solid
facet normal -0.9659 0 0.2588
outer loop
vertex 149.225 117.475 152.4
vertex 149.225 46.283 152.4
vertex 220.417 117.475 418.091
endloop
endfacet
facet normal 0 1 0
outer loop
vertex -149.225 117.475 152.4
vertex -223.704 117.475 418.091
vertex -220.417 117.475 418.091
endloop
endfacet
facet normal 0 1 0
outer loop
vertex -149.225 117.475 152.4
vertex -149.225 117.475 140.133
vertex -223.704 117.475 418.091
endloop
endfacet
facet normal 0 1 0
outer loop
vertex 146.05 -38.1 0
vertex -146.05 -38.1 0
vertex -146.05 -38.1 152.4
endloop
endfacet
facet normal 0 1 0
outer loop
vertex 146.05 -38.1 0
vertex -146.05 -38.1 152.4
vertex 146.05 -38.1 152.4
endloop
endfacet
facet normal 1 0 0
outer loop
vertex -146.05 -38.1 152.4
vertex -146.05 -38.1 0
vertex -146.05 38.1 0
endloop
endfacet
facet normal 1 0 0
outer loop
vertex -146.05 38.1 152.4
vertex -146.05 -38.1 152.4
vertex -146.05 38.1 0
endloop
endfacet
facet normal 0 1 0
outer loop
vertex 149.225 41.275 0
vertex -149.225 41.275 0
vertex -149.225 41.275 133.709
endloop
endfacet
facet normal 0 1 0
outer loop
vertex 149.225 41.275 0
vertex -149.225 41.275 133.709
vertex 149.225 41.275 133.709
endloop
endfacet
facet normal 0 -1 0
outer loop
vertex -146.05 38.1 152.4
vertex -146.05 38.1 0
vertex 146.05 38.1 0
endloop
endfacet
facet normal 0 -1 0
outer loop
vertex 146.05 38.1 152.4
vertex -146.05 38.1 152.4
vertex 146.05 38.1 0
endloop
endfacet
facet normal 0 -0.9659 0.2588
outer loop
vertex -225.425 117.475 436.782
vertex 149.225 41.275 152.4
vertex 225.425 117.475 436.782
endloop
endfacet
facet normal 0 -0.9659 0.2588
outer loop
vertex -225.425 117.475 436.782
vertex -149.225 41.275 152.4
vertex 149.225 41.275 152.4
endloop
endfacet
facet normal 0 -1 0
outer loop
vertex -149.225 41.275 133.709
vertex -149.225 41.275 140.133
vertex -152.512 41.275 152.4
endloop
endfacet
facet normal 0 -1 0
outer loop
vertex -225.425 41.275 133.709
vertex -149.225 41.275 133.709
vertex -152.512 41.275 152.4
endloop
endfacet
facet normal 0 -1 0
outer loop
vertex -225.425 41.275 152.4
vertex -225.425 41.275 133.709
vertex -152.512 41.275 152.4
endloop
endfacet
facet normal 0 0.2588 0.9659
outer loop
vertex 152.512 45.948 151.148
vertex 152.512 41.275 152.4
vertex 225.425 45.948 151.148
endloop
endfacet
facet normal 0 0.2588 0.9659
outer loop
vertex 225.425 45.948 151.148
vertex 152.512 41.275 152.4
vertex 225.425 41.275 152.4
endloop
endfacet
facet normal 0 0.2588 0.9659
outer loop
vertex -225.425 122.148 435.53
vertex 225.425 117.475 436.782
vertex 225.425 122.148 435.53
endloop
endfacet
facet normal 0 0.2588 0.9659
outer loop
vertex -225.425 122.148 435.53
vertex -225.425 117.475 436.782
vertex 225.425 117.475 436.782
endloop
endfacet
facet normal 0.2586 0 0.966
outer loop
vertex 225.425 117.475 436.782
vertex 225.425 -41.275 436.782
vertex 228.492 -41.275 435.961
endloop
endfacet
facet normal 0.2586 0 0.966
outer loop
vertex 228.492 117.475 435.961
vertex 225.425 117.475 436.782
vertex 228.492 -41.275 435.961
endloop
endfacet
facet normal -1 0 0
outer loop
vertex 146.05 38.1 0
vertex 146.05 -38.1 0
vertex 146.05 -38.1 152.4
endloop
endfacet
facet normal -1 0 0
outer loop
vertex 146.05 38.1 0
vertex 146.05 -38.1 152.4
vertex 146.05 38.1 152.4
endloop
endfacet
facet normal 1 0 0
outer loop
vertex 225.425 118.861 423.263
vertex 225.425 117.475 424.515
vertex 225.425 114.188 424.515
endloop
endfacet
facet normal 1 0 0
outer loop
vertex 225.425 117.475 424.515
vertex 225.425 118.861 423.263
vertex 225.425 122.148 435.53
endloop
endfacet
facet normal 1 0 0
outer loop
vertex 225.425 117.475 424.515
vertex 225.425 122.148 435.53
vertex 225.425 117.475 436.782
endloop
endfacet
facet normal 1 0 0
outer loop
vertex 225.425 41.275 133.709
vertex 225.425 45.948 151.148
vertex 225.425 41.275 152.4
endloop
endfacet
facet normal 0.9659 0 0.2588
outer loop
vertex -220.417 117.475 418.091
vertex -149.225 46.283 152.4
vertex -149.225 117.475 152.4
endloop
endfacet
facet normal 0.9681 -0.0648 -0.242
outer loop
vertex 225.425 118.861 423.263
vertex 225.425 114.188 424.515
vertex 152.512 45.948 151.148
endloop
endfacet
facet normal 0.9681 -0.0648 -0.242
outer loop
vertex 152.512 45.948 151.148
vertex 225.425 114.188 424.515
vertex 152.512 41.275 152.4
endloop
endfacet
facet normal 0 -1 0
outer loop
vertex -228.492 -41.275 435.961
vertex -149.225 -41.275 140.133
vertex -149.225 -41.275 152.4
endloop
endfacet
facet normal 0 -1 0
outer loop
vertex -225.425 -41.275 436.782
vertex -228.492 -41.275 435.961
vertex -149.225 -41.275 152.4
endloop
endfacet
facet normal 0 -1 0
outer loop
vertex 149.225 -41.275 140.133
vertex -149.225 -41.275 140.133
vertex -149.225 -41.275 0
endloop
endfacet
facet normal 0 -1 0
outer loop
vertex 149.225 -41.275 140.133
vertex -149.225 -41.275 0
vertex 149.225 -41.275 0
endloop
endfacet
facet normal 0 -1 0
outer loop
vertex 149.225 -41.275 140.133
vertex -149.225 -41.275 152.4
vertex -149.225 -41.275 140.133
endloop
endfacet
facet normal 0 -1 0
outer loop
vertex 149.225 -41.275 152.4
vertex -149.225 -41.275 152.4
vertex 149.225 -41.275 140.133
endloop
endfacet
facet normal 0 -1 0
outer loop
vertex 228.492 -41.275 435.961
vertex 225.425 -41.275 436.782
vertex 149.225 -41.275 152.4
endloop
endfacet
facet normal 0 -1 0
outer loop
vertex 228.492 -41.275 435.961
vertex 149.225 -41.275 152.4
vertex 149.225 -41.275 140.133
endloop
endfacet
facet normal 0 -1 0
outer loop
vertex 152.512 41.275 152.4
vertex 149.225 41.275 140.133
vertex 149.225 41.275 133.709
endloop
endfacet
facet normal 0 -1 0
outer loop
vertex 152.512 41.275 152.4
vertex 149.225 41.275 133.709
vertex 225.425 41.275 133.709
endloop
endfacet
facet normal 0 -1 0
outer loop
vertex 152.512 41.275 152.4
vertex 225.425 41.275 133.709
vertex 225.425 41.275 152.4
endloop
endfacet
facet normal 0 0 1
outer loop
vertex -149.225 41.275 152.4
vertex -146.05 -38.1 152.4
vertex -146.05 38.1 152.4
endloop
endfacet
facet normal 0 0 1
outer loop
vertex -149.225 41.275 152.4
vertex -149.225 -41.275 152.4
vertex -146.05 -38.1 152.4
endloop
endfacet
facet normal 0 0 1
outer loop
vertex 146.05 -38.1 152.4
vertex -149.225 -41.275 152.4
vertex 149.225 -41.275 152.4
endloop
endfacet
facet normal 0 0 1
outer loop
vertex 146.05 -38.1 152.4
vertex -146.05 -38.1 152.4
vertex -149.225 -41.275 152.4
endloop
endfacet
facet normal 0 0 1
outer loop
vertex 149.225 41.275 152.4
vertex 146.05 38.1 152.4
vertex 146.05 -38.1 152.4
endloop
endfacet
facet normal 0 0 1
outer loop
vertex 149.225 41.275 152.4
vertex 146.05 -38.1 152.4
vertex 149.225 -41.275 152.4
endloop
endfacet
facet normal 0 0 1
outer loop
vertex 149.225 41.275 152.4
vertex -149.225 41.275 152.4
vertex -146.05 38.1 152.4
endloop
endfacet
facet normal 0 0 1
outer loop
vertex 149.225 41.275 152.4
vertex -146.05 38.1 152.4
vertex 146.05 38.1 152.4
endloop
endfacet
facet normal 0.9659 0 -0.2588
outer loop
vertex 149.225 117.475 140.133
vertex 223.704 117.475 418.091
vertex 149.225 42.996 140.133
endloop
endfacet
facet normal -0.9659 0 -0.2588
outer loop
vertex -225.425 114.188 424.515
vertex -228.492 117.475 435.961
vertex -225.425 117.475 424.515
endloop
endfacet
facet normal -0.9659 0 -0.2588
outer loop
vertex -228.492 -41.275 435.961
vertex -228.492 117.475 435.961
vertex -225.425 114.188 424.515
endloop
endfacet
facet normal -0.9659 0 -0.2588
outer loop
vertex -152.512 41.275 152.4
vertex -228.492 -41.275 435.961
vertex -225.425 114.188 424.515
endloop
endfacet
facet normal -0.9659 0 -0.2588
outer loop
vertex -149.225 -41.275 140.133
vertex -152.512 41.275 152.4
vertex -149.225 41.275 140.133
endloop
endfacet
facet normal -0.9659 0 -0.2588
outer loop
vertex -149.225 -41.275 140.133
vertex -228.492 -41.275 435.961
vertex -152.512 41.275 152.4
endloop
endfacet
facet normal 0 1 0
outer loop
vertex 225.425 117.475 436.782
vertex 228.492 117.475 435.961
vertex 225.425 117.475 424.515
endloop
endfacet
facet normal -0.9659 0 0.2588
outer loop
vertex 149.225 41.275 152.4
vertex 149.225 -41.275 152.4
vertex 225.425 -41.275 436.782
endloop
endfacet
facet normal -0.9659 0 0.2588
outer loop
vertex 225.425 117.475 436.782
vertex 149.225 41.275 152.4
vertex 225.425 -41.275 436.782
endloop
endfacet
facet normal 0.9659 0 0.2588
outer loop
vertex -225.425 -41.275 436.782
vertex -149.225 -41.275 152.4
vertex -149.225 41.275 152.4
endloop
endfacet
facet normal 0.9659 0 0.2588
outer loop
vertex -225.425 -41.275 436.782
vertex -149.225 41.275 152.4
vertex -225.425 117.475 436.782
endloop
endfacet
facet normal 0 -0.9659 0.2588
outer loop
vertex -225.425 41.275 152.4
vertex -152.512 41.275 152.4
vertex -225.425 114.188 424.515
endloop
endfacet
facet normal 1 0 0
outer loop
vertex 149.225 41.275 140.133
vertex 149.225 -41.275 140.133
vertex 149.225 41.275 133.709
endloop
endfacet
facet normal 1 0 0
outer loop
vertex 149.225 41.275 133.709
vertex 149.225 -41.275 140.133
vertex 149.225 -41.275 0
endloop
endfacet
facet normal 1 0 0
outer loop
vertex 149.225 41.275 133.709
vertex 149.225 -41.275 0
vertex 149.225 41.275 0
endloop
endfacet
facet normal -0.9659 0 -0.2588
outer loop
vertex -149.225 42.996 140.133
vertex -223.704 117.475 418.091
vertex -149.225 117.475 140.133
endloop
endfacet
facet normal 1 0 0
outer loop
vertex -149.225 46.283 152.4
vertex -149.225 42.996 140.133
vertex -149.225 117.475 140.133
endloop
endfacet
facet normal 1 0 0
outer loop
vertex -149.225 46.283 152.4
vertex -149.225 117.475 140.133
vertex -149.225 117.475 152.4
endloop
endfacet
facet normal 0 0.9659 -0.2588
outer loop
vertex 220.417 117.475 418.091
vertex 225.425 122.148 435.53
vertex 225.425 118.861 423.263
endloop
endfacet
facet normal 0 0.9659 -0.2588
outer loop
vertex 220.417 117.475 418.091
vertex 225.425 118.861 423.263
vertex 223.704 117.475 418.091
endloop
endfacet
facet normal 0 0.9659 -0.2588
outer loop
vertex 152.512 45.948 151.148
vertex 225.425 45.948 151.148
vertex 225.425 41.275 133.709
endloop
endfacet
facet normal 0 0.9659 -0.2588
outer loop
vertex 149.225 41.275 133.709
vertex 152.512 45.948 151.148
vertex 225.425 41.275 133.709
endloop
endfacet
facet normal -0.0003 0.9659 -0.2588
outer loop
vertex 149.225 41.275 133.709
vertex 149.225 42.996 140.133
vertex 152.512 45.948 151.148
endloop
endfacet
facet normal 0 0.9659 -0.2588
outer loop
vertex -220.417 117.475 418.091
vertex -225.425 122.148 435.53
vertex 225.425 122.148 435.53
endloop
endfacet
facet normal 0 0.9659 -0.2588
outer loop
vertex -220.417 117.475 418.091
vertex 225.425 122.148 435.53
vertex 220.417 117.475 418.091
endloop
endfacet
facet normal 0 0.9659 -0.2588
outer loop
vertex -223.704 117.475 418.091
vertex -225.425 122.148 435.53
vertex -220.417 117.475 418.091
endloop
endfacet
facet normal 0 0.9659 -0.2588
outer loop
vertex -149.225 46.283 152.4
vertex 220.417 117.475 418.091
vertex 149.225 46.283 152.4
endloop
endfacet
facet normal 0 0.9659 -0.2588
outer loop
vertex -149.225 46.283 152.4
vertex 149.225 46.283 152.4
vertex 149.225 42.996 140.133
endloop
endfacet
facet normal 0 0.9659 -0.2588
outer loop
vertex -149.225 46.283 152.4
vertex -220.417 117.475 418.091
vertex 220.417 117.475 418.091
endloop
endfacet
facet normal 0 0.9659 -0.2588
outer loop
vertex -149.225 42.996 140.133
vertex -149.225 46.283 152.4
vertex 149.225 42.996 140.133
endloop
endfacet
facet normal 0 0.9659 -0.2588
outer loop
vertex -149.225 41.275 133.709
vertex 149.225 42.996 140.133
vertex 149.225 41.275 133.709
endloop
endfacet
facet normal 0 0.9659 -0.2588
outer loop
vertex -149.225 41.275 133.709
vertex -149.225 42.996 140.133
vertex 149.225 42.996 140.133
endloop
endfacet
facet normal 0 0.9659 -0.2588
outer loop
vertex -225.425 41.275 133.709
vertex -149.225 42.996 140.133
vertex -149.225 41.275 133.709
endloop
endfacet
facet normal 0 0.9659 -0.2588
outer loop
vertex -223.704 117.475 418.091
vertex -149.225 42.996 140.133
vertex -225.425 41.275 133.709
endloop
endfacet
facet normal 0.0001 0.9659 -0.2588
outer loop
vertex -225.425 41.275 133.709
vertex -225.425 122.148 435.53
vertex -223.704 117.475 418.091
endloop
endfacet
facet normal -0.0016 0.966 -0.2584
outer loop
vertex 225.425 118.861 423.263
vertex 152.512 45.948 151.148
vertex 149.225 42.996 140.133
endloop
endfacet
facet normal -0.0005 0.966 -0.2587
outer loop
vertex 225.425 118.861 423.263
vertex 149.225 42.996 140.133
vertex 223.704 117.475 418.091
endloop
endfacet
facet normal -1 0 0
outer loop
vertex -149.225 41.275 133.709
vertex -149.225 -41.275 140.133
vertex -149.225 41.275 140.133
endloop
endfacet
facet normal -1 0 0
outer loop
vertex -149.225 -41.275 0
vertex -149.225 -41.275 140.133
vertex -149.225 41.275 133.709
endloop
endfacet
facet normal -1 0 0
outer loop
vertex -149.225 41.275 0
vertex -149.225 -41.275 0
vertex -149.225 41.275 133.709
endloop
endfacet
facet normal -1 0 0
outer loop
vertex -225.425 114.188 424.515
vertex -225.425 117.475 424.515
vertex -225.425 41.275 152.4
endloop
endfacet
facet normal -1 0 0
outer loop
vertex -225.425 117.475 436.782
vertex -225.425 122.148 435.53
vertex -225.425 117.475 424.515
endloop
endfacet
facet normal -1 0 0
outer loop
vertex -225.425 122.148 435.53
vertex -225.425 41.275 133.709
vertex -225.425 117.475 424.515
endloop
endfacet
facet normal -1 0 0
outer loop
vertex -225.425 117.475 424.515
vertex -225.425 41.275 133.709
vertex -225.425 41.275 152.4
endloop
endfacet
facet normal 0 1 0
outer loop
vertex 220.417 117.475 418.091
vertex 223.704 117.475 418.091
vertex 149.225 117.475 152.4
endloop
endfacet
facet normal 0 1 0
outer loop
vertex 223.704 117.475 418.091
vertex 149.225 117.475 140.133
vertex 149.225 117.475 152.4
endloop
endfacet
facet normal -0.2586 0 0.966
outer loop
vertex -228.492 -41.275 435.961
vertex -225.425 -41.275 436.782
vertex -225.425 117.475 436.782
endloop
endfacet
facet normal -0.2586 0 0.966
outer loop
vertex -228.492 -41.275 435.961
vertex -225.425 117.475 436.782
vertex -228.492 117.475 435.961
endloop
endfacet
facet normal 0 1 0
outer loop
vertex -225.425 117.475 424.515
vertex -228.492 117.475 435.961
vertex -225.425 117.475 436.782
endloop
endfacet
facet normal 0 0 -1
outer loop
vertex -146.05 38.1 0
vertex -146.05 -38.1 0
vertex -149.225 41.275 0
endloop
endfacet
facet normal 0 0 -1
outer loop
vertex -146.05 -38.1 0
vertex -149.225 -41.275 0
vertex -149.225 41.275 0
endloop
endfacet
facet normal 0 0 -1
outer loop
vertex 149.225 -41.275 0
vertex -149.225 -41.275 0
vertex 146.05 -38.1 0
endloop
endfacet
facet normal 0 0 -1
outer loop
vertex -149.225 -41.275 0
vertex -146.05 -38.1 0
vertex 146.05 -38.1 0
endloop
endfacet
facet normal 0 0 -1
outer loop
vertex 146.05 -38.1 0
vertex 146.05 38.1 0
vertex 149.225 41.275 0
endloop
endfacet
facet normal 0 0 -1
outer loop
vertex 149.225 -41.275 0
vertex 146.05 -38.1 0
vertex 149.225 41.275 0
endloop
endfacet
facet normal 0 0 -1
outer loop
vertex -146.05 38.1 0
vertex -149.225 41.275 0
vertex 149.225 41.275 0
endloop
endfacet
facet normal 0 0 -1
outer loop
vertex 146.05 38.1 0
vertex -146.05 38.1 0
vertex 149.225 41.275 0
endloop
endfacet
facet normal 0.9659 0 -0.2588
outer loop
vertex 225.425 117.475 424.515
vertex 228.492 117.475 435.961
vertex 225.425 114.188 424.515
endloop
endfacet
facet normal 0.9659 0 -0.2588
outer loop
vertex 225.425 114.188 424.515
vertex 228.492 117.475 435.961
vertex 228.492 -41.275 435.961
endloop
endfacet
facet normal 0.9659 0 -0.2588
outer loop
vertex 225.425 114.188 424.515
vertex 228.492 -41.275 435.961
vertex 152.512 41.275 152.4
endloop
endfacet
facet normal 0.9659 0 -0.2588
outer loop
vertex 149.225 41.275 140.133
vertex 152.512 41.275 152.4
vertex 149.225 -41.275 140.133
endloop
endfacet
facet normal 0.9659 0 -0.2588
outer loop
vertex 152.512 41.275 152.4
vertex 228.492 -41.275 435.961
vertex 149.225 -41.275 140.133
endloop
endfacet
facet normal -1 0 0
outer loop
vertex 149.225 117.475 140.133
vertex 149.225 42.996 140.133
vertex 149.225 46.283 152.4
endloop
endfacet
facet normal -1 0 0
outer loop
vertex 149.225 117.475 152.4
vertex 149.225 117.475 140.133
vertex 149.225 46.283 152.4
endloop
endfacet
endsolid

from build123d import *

# Parameters (mm, degrees)
F0_W          = 298.45
F0_H          = 82.55
F0_W_2        = 292.1
F0_H_2        = 76.2
F1_DEPTH      = 152.4
F4_DEPTH      = 158.75
F5_DEPTH      = 254
F5_DEPTH_BACK = 76.2
F7_DEPTH      = 25.4


with BuildPart() as f1:
    # F0 (on Top) → F1 (new body)
    with BuildSketch(Plane.XY):
        Rectangle(F0_W, F0_H)
        Rectangle(F0_W_2, F0_H_2, mode=Mode.SUBTRACT)
    extrude(amount=F1_DEPTH)

    # F2 (on face) → F4 (join)
    with BuildSketch(Plane.XZ.offset(41.275)):
        Polygon((-149.225, 140.1327420061), (-149.225, 152.4), (-225.425, 436.7822715367), (-228.4918144985, 435.9605210685), align=None)
    extrude(amount=-F4_DEPTH)

    # F3 (on face) → F5 (join, two sides)
    with BuildSketch(Plane(origin=(-149.225, 0, 0), x_dir=(0, -1, 0), z_dir=(-1, 0, 0))) as f5_sk:
        Polygon((-41.275, 133.7086633322), (-41.275, 152.4), (-117.475, 436.7822715367), (-122.147834167, 435.5301893953), align=None)
    extrude(amount=-F5_DEPTH)
    extrude(f5_sk.sketch, amount=F5_DEPTH_BACK)

    # F6: F1 across plane


with BuildPart() as f1_1:
    add(f1.part)
    add(f1.part.mirror(Plane.YZ))

    # F7 (cut): a face of the model
    f7_faces = [f1_1.faces().sort_by_distance(p)[0] for p in [
        (201.1206672909, 65.5793327091, 243.1050045143),
    ]]
    extrude(f7_faces, amount=-F7_DEPTH, mode=Mode.SUBTRACT)


solid = f1_1.part
